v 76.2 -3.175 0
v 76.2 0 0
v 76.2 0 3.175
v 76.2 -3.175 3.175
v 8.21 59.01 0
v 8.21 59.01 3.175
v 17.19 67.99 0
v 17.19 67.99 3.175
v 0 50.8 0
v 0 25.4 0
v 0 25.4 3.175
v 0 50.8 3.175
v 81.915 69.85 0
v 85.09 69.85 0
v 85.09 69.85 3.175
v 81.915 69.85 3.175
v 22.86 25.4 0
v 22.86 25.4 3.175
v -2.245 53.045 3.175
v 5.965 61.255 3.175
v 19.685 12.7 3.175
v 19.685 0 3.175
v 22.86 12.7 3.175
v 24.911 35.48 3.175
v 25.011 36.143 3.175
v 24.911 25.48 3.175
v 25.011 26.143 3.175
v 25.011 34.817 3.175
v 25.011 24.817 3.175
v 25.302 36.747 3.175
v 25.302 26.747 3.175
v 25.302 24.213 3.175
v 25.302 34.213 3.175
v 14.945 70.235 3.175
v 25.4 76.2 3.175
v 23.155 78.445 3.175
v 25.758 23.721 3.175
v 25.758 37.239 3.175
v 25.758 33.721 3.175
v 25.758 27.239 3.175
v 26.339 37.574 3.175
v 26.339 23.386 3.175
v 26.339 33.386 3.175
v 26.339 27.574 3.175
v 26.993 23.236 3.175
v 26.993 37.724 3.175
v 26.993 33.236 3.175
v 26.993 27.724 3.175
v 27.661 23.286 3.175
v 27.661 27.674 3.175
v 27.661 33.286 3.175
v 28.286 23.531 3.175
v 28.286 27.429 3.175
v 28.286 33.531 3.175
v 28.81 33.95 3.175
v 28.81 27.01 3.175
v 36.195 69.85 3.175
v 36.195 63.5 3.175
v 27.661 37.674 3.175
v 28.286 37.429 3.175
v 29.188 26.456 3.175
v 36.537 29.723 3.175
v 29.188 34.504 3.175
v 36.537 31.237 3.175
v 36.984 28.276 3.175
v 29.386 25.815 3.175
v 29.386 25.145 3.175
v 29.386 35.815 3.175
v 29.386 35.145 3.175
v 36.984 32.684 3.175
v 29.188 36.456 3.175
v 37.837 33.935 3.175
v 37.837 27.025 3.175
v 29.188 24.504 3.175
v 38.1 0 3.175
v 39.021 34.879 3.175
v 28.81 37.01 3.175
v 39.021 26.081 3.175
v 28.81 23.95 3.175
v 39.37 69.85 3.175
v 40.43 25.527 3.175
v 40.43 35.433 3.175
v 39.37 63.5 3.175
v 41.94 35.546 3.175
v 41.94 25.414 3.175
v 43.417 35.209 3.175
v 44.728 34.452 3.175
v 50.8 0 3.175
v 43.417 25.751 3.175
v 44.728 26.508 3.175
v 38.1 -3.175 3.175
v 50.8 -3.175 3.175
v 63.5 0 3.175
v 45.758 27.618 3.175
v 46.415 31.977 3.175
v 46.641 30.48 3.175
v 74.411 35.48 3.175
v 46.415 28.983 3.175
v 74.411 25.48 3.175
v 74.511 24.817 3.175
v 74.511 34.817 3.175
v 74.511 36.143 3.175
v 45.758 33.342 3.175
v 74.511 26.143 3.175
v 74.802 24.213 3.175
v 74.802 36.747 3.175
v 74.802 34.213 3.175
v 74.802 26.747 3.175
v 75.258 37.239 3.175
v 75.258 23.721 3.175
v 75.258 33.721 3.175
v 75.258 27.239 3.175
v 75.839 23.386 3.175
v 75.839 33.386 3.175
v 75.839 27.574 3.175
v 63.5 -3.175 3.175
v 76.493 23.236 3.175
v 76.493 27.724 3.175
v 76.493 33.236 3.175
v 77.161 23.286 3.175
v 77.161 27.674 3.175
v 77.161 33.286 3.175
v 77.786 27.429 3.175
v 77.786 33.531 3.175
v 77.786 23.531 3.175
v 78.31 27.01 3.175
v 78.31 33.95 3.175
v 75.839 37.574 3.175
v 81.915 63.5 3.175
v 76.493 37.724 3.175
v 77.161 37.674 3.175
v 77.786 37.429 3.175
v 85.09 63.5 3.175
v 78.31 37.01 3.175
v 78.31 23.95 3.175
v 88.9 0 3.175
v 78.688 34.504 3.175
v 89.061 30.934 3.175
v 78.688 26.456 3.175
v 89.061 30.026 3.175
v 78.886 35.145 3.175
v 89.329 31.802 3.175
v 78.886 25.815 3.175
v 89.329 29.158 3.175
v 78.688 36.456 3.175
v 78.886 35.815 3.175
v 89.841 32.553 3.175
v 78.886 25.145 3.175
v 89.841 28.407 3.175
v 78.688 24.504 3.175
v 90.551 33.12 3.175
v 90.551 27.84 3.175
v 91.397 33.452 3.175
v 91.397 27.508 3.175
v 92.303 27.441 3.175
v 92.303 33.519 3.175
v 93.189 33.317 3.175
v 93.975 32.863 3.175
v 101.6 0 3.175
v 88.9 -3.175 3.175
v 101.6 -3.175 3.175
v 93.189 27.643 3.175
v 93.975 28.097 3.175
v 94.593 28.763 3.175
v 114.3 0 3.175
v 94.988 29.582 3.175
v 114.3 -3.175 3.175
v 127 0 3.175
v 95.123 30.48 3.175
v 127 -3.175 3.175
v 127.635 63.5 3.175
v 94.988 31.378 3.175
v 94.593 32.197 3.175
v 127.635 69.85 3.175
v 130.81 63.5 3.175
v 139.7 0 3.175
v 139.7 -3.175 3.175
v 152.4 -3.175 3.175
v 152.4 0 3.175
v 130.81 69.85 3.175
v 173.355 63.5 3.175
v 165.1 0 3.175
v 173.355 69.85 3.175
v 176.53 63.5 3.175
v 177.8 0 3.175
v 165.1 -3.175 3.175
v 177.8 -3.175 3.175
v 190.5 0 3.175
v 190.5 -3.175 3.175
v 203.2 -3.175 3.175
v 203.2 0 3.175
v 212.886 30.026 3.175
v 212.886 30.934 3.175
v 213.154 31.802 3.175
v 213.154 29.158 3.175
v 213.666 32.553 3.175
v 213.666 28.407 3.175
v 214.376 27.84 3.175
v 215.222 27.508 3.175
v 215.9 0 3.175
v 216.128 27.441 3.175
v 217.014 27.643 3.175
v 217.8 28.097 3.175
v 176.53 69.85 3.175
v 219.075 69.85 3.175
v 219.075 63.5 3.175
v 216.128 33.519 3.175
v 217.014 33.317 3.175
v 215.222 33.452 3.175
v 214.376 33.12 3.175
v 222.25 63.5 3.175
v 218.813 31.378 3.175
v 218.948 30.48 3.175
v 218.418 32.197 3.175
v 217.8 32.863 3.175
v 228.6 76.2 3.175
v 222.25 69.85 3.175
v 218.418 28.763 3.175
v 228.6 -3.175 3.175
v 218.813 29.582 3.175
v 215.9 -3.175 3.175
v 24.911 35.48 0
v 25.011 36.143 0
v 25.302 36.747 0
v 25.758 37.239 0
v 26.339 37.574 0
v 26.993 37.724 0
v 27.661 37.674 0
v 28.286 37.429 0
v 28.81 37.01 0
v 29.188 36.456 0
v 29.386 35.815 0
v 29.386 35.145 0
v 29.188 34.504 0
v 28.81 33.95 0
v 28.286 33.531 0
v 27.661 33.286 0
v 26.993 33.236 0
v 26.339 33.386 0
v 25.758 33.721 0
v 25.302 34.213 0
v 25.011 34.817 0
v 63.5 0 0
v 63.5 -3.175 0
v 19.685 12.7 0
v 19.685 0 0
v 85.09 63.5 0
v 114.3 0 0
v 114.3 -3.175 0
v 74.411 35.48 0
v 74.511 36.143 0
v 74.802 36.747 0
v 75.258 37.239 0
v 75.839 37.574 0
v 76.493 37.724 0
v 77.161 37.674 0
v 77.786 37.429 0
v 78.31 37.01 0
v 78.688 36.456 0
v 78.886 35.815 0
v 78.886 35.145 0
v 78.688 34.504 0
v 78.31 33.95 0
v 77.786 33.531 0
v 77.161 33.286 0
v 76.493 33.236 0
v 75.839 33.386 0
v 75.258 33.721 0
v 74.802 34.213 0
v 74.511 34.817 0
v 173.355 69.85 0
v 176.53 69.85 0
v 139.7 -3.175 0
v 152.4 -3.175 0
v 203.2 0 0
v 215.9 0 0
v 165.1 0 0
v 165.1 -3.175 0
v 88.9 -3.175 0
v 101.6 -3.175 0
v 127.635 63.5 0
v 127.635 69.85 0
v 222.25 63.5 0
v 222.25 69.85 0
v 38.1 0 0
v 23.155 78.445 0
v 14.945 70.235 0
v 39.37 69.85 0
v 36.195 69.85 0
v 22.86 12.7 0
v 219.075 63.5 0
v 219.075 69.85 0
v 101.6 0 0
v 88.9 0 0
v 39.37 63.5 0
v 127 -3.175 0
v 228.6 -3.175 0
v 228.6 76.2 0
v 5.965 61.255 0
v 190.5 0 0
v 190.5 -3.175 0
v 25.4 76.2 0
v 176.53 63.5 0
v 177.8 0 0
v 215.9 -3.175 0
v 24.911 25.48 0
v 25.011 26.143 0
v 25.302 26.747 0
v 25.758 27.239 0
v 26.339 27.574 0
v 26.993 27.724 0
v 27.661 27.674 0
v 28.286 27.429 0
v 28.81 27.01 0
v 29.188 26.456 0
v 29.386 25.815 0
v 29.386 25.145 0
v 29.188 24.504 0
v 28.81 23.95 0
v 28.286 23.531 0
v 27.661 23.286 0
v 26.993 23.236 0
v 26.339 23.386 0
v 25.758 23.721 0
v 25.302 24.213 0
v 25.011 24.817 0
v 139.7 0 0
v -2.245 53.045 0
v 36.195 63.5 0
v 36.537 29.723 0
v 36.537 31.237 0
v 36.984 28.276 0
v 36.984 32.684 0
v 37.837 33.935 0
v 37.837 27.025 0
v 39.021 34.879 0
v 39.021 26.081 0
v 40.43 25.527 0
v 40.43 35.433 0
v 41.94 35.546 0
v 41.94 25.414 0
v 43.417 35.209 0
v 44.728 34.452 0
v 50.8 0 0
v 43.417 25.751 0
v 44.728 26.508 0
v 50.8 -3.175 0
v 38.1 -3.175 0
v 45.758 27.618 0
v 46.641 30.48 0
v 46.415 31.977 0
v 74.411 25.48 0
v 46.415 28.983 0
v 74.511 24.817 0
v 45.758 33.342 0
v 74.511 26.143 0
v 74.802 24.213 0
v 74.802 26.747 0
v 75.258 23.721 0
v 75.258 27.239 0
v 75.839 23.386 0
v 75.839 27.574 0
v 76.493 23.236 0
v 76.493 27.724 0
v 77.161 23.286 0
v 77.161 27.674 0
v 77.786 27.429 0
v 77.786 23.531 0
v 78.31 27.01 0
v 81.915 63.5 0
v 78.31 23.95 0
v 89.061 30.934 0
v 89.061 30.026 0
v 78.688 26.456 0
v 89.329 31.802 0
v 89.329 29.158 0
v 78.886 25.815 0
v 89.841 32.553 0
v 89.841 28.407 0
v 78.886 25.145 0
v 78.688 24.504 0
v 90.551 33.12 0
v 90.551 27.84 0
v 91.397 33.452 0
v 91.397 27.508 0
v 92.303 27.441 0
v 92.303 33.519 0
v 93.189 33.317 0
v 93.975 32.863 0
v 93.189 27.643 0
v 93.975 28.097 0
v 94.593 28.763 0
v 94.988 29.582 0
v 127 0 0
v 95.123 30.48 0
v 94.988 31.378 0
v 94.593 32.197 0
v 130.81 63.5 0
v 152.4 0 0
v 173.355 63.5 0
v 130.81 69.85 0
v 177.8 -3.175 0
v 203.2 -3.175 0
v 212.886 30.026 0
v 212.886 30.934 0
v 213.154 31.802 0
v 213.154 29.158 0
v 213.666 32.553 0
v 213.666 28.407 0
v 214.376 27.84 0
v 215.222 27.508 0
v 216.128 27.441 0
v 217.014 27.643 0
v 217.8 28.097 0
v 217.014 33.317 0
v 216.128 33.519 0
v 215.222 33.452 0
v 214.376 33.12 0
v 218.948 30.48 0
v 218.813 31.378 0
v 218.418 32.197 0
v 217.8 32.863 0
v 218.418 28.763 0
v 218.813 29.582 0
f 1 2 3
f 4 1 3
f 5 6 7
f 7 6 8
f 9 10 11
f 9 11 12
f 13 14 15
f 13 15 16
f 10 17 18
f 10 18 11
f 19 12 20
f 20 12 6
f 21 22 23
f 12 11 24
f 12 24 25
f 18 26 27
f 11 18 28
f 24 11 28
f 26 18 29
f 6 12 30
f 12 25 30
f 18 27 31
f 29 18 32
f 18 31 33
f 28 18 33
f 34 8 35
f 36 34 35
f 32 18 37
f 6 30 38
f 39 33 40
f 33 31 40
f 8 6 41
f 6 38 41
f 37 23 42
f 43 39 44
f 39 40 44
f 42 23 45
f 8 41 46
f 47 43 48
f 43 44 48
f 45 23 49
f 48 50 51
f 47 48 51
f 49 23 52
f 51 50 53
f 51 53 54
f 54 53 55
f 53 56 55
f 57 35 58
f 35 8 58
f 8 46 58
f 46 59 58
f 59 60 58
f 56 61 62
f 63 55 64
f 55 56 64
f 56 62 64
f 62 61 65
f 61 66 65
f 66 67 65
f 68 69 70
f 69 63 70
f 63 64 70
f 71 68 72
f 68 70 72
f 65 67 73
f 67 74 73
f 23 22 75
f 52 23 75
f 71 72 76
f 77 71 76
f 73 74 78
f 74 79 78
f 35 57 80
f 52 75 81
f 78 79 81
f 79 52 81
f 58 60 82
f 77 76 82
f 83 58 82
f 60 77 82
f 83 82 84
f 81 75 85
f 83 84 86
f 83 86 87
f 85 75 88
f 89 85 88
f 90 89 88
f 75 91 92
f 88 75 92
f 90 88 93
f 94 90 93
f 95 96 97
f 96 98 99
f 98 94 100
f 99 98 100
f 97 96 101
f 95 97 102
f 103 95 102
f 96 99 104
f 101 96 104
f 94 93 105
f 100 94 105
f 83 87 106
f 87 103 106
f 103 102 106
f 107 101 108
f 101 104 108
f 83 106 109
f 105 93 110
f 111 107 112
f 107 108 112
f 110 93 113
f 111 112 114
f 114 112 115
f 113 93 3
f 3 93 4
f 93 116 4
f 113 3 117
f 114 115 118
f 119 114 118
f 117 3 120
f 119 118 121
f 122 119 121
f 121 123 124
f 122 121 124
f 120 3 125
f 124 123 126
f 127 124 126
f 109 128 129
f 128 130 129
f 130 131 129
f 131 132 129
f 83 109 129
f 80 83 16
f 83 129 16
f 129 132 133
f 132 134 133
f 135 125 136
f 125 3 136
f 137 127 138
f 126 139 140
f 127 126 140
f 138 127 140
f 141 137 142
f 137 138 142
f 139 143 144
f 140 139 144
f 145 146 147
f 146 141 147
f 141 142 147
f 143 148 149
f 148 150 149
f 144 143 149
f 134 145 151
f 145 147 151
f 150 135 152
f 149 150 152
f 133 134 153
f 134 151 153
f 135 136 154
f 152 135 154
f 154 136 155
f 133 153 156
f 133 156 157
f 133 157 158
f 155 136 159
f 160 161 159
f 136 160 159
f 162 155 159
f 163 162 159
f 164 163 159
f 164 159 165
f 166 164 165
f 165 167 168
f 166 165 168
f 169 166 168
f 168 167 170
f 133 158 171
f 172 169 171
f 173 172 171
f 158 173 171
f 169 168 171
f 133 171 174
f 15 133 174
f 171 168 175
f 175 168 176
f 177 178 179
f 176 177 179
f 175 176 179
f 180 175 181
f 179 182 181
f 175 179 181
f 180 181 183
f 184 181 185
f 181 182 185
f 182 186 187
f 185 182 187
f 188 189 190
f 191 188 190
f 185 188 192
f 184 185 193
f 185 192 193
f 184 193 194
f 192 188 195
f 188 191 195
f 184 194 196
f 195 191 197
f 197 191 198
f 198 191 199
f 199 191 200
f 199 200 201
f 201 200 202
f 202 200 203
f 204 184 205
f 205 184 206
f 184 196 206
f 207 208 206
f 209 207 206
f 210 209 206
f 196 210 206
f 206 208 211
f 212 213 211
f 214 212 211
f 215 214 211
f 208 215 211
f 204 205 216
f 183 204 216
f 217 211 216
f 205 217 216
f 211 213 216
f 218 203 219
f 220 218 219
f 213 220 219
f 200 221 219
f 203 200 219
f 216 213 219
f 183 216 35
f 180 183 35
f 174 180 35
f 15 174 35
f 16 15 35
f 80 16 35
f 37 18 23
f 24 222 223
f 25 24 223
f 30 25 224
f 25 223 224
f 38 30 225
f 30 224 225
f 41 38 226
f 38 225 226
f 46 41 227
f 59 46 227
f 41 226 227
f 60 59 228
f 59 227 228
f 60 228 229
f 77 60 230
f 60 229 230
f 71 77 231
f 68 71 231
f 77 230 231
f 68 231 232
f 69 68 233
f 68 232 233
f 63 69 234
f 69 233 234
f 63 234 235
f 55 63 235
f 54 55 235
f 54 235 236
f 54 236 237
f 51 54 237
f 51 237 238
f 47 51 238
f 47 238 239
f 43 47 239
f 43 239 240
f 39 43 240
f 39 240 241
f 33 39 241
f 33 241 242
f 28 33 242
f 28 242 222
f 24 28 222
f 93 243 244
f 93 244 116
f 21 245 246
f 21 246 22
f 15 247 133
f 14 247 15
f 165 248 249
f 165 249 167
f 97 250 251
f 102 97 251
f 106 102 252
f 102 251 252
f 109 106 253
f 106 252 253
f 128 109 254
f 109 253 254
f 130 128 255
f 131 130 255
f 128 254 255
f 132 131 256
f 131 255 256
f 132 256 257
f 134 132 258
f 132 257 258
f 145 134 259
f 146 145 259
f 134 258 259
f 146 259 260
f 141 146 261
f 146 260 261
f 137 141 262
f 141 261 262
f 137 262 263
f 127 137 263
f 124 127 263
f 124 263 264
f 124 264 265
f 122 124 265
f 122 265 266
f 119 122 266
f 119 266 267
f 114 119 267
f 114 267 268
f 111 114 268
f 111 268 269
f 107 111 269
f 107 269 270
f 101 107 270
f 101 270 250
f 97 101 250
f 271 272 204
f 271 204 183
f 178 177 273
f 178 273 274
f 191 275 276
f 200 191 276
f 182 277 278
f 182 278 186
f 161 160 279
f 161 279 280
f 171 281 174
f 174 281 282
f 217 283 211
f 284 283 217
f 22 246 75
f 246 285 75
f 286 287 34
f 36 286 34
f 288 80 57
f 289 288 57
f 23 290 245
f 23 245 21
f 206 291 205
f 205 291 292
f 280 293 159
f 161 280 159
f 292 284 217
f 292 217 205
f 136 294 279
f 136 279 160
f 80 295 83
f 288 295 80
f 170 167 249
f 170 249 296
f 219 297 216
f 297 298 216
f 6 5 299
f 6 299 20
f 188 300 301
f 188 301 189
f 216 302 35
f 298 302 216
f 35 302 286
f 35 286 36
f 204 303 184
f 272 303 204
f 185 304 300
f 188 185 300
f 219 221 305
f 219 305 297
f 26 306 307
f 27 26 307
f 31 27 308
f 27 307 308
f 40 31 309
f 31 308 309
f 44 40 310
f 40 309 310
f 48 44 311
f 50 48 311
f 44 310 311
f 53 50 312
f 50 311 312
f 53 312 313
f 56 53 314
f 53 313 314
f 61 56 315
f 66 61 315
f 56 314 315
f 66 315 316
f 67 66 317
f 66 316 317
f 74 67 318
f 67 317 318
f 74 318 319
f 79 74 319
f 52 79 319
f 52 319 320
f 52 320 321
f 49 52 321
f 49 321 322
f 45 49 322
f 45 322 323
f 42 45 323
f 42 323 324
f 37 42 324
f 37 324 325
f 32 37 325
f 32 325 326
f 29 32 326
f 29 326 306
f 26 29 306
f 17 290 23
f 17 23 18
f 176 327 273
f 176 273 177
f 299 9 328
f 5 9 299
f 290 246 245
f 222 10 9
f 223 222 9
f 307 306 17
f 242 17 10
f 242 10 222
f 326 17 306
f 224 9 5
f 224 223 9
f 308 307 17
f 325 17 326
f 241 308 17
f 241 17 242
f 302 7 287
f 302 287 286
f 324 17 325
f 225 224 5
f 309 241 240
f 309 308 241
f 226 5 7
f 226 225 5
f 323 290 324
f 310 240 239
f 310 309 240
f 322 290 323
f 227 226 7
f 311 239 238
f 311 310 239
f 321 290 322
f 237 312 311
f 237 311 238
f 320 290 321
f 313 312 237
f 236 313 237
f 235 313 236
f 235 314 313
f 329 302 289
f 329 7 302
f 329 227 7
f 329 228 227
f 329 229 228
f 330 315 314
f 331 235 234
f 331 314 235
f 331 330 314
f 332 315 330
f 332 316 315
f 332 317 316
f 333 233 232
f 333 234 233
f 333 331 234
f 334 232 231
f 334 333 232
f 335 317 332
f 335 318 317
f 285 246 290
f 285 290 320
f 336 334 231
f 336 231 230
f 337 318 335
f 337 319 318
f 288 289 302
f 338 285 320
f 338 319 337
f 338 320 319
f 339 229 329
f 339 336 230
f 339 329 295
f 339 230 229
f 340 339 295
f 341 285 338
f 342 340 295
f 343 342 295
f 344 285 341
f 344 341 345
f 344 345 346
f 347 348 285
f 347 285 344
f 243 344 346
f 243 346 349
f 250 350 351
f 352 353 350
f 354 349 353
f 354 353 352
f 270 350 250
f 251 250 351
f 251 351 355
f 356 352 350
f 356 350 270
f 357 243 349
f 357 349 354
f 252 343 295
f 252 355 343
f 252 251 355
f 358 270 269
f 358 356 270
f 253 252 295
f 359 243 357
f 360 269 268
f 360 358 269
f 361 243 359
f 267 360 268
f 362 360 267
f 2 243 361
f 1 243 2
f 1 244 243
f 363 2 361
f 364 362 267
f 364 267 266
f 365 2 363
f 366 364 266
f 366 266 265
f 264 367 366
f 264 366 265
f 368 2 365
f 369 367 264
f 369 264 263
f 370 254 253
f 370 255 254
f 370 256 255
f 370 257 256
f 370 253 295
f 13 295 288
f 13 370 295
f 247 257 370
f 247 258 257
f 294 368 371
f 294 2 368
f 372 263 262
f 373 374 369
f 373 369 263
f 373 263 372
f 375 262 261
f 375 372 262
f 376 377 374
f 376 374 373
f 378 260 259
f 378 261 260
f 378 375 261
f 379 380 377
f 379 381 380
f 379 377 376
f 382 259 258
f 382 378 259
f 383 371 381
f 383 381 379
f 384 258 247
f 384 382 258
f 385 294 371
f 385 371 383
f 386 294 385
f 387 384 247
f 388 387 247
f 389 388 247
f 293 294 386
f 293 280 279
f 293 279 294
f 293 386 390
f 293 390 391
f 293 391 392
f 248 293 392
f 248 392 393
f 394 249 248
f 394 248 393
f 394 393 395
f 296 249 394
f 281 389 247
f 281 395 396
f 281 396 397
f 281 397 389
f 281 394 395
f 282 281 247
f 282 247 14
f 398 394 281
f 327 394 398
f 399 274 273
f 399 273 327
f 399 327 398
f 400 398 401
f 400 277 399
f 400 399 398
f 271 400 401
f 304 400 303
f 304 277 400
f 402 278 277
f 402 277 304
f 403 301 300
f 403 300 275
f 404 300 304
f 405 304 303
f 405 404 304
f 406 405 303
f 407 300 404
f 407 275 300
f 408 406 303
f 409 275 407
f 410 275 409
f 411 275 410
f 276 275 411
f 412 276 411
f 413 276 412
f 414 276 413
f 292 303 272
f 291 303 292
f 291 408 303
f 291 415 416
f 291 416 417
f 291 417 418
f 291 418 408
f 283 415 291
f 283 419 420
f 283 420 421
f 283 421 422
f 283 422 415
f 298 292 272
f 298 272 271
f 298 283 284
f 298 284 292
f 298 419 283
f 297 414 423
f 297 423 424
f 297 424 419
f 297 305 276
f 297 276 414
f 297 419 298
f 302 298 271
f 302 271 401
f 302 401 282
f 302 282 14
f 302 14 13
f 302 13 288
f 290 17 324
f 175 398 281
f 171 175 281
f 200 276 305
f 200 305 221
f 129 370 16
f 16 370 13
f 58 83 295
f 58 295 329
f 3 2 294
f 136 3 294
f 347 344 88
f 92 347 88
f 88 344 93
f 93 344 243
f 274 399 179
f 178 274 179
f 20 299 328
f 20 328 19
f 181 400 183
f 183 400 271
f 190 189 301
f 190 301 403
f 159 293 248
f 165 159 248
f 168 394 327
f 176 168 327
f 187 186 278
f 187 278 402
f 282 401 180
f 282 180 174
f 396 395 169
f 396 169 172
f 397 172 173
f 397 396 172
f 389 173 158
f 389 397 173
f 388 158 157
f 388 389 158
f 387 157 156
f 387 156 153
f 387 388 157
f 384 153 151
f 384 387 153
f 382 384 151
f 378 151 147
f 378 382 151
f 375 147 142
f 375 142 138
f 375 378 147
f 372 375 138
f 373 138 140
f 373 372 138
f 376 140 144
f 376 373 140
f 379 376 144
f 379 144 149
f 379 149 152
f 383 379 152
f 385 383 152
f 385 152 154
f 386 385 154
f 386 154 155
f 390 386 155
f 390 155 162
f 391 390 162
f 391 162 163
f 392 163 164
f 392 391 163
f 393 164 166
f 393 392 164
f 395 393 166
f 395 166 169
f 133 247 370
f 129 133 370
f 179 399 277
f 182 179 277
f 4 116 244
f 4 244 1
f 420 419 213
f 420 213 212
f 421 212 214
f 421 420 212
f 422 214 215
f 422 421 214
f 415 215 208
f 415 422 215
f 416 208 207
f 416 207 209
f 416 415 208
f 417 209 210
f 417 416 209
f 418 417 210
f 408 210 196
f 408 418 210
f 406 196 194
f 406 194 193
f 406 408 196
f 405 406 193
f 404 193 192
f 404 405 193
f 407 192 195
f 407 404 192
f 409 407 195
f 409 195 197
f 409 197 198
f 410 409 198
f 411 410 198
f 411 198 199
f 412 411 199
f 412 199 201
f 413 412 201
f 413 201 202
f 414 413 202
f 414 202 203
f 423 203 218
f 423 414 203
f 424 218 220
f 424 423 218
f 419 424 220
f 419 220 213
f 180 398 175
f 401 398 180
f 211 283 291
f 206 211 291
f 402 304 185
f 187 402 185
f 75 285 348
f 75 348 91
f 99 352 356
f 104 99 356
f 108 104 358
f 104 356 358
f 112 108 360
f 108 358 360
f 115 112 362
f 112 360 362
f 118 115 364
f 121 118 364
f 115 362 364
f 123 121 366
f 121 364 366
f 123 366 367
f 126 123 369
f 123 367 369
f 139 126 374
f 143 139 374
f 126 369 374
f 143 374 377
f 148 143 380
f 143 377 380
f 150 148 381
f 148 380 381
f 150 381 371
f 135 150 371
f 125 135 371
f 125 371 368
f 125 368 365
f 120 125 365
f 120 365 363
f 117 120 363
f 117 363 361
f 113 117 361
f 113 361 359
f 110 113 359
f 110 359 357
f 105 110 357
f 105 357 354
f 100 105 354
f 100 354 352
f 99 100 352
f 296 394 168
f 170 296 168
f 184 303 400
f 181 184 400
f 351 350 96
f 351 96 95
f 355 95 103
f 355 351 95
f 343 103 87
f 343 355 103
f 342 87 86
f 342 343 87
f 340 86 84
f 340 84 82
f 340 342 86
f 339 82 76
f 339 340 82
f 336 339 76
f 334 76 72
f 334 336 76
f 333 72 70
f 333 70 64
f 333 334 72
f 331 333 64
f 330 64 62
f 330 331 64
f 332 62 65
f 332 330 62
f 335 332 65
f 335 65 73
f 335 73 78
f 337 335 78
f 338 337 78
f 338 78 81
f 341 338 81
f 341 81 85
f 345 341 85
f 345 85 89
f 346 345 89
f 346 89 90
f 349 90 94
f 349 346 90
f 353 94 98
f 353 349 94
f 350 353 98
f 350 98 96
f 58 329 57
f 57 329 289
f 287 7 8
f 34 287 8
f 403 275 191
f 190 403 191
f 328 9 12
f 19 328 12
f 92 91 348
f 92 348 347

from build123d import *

# Parameters (mm, degrees)
SKETCH1_W           = 228.6
SKETCH1_H           = 76.2
SKETCH1_R           = 3.048
SKETCH1_R_2         = 5.08
BOSS_EXTRUDE1_DEPTH = 3.175
SKETCH2_W           = 12.7
SKETCH2_H           = 3.175
BOSS_EXTRUDE2_DEPTH = 3.175
SKETCH3_W           = 22.86
SKETCH3_H           = 25.4
CUT_EXTRUDE1_DEPTH  = 4.175
SKETCH4_W           = 3.175
SKETCH4_H           = 12.7
BOSS_EXTRUDE3_DEPTH = 3.175
SKETCH6_R           = 2.25
CUT_EXTRUDE2_DEPTH  = 4.175
CUT_EXTRUDE3_DEPTH  = 4.175
SKETCH12_W          = 3.175
SKETCH12_H          = 6.35
CUT_EXTRUDE5_DEPTH  = 3.175
SKETCH13_W          = 3.175
SKETCH13_H          = 11.610512243
SKETCH13_H_2        = 11.610512242
BOSS_EXTRUDE5_DEPTH = 3.175


with BuildPart() as part:
    # Sketch1 → Boss-Extrude1 (new body)
    with BuildSketch(Plane.XY):
        with Locations((114.3, 38.1)):
            Rectangle(SKETCH1_W, SKETCH1_H)
        with Locations((215.9, 30.48)):
            Circle(SKETCH1_R, mode=Mode.SUBTRACT)
        with Locations((92.075, 30.48)):
            Circle(SKETCH1_R, mode=Mode.SUBTRACT)
        with Locations((41.56075, 30.48)):
            Circle(SKETCH1_R_2, mode=Mode.SUBTRACT)
    extrude(amount=BOSS_EXTRUDE1_DEPTH)

    # Sketch2 → Boss-Extrude2 (add)
    with BuildSketch(Plane.XZ):
        with Locations((222.25, 1.5875)):
            Rectangle(SKETCH2_W, SKETCH2_H)
        with Locations((196.85, 1.5875)):
            Rectangle(SKETCH2_W, SKETCH2_H)
        with Locations((171.45, 1.5875)):
            Rectangle(SKETCH2_W, SKETCH2_H)
        with Locations((146.05, 1.5875)):
            Rectangle(SKETCH2_W, SKETCH2_H)
        with Locations((120.65, 1.5875)):
            Rectangle(SKETCH2_W, SKETCH2_H)
        with Locations((95.25, 1.5875)):
            Rectangle(SKETCH2_W, SKETCH2_H)
        with Locations((69.85, 1.5875)):
            Rectangle(SKETCH2_W, SKETCH2_H)
        with Locations((44.45, 1.5875)):
            Rectangle(SKETCH2_W, SKETCH2_H)
    extrude(amount=BOSS_EXTRUDE2_DEPTH)

    # Sketch3 → Cut-Extrude1 (cut, through all)
    with BuildSketch(Plane(origin=(0, 0, 0), x_dir=(-1, 0, 0), z_dir=(0, 0, -1))):
        with Locations((-11.43, 12.7)):
            Rectangle(SKETCH3_W, SKETCH3_H)
    extrude(amount=-CUT_EXTRUDE1_DEPTH, mode=Mode.SUBTRACT)

    # Sketch4 → Boss-Extrude3 (add)
    with BuildSketch(Plane.ZY.offset(-22.86)):
        with Locations((1.5875, 6.35)):
            Rectangle(SKETCH4_W, SKETCH4_H)
    extrude(amount=BOSS_EXTRUDE3_DEPTH)

    # Sketch6 → Cut-Extrude2 (cut, through all)
    with BuildSketch(Plane(origin=(0, 0, 0), x_dir=(-1, 0, 0), z_dir=(0, 0, -1))):
        with Locations((-27.16075, 35.48)):
            Circle(SKETCH6_R)
        with Locations((-27.16075, 25.48)):
            Circle(SKETCH6_R)
        with Locations((-76.66075, 35.48)):
            Circle(SKETCH6_R)
        with Locations((-76.66075, 25.48)):
            Circle(SKETCH6_R)
    extrude(amount=-CUT_EXTRUDE2_DEPTH, mode=Mode.SUBTRACT)

    # Sketch8 → Cut-Extrude3 (cut, through all)
    with BuildSketch(Plane.XY.offset(3.175)):
        Polygon((25.4, 76.2), (0, 76.2), (0, 50.8), align=None)
    extrude(amount=-CUT_EXTRUDE3_DEPTH, mode=Mode.SUBTRACT)

    # Sketch12 → Cut-Extrude5 (cut)
    with BuildSketch(Plane(origin=(0, 0, 0), x_dir=(-1, 0, 0), z_dir=(0, 0, -1))):
        with Locations((-220.6625, 66.675)):
            Rectangle(SKETCH12_W, SKETCH12_H)
        with Locations((-174.9425, 66.675)):
            Rectangle(SKETCH12_W, SKETCH12_H)
        with Locations((-129.2225, 66.675)):
            Rectangle(SKETCH12_W, SKETCH12_H)
        with Locations((-83.5025, 66.675)):
            Rectangle(SKETCH12_W, SKETCH12_H)
        with Locations((-37.7825, 66.675)):
            Rectangle(SKETCH12_W, SKETCH12_H)
    extrude(amount=-CUT_EXTRUDE5_DEPTH, mode=Mode.SUBTRACT)

    # Sketch13 → Boss-Extrude5 (add)
    with BuildSketch(Plane(origin=(-25.4, 25.4, 0), x_dir=(0, 0, 1), z_dir=(-0.707106781, 0.707106781, 0))):
        with Locations((1.5875, 66.036792848)):
            Rectangle(SKETCH13_W, SKETCH13_H)
        with Locations((1.5875, 41.726280605)):
            Rectangle(SKETCH13_W, SKETCH13_H_2)
    extrude(amount=BOSS_EXTRUDE5_DEPTH)


solid = part.part
